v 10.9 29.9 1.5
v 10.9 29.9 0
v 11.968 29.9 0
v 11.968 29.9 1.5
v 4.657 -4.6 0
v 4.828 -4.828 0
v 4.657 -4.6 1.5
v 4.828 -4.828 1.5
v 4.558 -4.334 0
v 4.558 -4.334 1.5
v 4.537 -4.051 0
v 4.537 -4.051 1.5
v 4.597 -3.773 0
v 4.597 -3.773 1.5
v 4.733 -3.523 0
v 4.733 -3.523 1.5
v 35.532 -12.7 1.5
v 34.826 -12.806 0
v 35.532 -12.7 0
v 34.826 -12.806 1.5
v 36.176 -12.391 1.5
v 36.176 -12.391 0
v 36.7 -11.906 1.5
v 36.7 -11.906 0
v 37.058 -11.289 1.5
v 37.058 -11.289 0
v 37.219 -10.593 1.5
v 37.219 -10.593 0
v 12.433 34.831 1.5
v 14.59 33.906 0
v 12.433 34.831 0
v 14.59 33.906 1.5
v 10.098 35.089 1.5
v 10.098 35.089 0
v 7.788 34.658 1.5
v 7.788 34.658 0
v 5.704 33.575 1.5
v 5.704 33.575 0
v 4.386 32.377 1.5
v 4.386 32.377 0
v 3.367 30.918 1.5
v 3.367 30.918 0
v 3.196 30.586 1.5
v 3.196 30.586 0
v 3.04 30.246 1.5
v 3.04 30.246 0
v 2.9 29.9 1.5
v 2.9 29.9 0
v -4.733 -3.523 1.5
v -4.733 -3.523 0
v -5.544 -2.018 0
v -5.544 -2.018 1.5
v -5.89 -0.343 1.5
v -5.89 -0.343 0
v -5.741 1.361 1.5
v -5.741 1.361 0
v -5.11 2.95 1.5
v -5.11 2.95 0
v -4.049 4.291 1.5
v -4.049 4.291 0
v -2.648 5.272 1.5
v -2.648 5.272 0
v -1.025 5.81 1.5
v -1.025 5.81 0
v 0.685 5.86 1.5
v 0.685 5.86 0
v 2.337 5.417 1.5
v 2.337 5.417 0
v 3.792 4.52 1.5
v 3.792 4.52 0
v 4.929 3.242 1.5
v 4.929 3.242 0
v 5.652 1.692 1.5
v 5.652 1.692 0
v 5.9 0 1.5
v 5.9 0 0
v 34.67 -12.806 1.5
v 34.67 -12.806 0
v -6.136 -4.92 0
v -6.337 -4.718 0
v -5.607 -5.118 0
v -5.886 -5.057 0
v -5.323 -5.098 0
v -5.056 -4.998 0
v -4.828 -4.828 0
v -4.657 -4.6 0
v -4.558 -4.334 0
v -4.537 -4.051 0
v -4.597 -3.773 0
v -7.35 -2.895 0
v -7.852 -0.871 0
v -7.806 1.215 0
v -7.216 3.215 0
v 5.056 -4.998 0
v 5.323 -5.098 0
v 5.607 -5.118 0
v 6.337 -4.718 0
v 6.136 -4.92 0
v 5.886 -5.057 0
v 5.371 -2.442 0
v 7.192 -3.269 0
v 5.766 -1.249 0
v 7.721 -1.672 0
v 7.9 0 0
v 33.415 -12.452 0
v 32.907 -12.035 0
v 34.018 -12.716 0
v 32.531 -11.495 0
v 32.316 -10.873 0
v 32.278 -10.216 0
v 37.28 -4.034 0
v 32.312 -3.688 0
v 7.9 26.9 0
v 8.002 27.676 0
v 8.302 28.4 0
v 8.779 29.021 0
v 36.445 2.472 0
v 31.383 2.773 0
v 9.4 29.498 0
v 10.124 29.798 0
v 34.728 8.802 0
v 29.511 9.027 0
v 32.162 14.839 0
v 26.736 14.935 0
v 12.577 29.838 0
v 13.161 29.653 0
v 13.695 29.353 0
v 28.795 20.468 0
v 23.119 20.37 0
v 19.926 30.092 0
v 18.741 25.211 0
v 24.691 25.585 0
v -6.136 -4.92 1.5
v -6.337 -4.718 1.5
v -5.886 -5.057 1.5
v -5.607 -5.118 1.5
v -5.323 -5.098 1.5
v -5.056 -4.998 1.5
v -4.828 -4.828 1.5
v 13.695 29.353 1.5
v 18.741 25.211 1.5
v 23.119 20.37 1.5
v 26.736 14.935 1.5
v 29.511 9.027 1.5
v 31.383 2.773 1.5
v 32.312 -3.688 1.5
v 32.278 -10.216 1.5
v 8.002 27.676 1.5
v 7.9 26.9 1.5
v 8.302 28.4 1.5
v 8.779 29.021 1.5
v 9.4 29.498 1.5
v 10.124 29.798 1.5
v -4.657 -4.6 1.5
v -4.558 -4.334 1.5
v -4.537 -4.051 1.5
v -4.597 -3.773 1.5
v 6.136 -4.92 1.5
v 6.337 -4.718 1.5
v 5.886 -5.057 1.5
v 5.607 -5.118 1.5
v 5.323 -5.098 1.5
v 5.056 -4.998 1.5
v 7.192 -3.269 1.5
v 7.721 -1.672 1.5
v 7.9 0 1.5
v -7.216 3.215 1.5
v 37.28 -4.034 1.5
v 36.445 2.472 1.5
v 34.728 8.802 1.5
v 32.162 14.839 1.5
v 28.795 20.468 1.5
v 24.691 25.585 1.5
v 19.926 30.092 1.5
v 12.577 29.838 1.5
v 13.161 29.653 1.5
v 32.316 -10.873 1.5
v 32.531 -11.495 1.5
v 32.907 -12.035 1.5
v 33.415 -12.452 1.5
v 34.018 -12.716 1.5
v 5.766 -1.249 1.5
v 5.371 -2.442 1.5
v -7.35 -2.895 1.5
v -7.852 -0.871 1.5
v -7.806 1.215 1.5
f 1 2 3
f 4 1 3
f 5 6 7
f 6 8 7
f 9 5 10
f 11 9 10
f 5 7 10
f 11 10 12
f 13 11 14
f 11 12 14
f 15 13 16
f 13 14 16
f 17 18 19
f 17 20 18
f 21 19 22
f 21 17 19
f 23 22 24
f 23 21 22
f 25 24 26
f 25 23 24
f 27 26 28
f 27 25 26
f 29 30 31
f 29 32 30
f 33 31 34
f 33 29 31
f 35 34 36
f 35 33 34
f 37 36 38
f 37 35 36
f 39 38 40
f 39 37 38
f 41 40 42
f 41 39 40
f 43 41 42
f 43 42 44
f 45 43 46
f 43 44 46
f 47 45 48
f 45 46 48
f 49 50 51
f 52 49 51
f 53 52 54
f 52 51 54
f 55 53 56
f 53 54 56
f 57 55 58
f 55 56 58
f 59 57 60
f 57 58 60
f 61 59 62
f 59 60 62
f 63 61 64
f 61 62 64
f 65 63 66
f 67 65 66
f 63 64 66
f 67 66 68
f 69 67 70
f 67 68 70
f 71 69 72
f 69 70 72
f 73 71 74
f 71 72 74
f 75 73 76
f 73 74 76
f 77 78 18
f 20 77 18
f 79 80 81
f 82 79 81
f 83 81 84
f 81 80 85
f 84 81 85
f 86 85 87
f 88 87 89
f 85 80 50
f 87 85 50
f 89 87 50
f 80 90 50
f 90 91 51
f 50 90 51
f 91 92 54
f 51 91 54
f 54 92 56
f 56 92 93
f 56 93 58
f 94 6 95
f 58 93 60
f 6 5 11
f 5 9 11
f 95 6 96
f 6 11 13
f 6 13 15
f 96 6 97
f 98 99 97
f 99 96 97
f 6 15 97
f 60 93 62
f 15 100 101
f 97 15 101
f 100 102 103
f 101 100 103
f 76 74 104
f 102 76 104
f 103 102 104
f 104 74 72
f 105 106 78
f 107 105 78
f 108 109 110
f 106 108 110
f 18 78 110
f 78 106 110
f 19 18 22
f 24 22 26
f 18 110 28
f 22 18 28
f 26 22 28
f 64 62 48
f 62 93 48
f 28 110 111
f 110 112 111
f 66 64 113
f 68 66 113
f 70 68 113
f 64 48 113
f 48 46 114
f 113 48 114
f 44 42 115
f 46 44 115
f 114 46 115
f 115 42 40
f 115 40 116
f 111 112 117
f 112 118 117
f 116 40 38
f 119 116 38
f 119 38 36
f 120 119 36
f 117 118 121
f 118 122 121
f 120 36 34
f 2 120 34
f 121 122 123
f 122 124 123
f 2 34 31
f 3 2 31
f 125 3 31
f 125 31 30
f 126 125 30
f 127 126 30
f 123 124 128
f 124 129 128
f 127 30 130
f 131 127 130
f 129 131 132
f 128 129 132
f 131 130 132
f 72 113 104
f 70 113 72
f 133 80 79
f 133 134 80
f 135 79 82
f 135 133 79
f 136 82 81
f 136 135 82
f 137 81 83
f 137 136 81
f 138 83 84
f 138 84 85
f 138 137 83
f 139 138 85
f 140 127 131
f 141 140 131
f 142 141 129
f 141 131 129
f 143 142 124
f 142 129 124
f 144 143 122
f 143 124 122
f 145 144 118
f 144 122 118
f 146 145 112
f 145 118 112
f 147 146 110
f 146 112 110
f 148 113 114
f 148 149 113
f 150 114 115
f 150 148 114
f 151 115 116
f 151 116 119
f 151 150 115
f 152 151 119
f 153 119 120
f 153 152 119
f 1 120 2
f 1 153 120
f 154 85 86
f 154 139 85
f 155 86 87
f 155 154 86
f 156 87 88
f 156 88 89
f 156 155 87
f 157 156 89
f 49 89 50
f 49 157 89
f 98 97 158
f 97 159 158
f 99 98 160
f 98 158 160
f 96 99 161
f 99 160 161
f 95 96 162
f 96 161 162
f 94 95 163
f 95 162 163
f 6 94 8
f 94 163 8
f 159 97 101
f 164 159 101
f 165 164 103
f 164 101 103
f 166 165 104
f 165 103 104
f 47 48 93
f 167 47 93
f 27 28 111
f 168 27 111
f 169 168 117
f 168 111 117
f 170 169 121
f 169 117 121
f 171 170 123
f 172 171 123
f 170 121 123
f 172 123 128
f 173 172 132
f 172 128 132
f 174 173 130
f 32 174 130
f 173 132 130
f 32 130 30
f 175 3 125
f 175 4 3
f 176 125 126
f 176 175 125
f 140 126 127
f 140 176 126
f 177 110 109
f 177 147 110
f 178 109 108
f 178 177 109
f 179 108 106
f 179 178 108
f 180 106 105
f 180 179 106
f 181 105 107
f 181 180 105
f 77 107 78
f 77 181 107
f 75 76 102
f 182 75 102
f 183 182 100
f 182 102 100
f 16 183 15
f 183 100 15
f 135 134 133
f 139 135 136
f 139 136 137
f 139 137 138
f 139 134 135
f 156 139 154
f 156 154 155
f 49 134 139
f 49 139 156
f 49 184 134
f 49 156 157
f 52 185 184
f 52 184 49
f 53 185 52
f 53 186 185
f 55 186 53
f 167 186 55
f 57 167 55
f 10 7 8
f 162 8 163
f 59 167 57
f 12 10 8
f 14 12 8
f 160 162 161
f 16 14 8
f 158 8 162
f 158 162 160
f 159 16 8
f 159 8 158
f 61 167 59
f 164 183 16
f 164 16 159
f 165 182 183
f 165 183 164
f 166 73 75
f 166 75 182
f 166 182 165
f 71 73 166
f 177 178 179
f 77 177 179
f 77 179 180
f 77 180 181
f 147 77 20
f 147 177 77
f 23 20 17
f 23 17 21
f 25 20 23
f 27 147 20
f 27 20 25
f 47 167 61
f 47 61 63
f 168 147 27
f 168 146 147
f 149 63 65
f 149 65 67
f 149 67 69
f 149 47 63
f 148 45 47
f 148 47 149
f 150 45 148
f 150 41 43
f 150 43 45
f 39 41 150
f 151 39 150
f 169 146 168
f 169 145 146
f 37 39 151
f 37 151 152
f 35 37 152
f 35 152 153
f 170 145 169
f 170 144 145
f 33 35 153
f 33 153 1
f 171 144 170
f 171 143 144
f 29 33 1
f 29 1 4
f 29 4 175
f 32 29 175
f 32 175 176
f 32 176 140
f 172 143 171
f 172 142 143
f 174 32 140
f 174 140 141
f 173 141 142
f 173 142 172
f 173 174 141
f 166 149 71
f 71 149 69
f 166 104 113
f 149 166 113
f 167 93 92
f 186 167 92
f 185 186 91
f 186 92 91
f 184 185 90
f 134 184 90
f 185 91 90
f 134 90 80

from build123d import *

# Parameters (mm, degrees)
F1_DEPTH = 1.5
F2_R     = 3
F3_R     = 2.4
F4_R     = 0.99999
F5_R     = 8


# Not quite as in the source:
# - a fillet or chamfer is up to 0.001 mm smaller than in the source, because OpenCascade refuses the exact size


with BuildPart() as f1:
    # F0 (on Top) → F1 (new body)
    with BuildSketch(Plane.XY):
        with BuildLine():
            ThreePointArc((-7.2162480919, 3.2149282225), (1.6434171829, 7.7271715371), (7.9, 0))
            Line((7.9, 0), (7.9, 29.9))
            Line((7.9, 29.9), (2.9, 29.9))
            Line((2.9, 29.9), (-7.2162480919, 3.2149282225))
        make_face()
        with BuildLine():
            Line((2.9, 29.9), (7.9, 29.9))
            Line((7.9, 29.9), (12.9, 29.9))
            ThreePointArc((12.9, 29.9), (28.5747012766, 11.2865794971), (31.9942384958, -12.8062088042))
            Line((31.9942384958, -12.8062088042), (36.9942384958, -12.8062088042))
            ThreePointArc((36.9942384958, -12.8062088042), (32.2218442931, 14.721028685), (12.9, 34.9))
            ThreePointArc((12.9, 34.9), (6.9234468079, 34.3531063842), (2.9, 29.9))
        make_face()
        with BuildLine():
            ThreePointArc((5.9, 0), (5.4508892418, -2.257832251), (4.171930009, -4.171930009))
            Line((4.171930009, -4.171930009), (5.5861435714, -5.5861435714))
            ThreePointArc((5.5861435714, -5.5861435714), (7.2986483068, -3.0231991157), (7.9, 0))
            ThreePointArc((7.9, 0), (1.6434171829, 7.7271715371), (-7.2162480919, 3.2149282225))
            ThreePointArc((-7.2162480919, 3.2149282225), (-7.7678841556, -1.4387410276), (-5.5861435714, -5.5861435714))
            Line((-5.5861435714, -5.5861435714), (-4.171930009, -4.171930009))
            ThreePointArc((-4.171930009, -4.171930009), (-2.257832251, 5.4508892418), (5.9, 0))
        make_face()
    extrude(amount=F1_DEPTH)

    # F2
    f2_edges = [f1.edges().sort_by_distance(p)[0] for p in [
        (7.9, 29.9, 0.75),
        (12.9, 29.9, 0.75),
    ]]
    fillet(f2_edges, radius=F2_R)

    # F3
    f3_edges = [f1.edges().sort_by_distance(p)[0] for p in [
        (31.994238, -12.806209, 0.75),
        (36.994238, -12.806209, 0.75),
    ]]
    fillet(f3_edges, radius=F3_R)

    # F4 (radius 1 in the source; OpenCascade refuses exactly that, so slightly less here)
    f4_edges = [f1.edges().sort_by_distance(p)[0] for p in [
        (4.17193, -4.17193, 0.75),
        (-4.17193, -4.17193, 0.75),
        (5.586144, -5.586144, 0.75),
        (-5.586144, -5.586144, 0.75),
    ]]
    fillet(f4_edges, radius=F4_R)

    # F5
    f5_edges = [f1.edges().sort_by_distance(p)[0] for p in [
        (12.9, 34.9, 0.75),
    ]]
    fillet(f5_edges, radius=F5_R)


solid = f1.part
